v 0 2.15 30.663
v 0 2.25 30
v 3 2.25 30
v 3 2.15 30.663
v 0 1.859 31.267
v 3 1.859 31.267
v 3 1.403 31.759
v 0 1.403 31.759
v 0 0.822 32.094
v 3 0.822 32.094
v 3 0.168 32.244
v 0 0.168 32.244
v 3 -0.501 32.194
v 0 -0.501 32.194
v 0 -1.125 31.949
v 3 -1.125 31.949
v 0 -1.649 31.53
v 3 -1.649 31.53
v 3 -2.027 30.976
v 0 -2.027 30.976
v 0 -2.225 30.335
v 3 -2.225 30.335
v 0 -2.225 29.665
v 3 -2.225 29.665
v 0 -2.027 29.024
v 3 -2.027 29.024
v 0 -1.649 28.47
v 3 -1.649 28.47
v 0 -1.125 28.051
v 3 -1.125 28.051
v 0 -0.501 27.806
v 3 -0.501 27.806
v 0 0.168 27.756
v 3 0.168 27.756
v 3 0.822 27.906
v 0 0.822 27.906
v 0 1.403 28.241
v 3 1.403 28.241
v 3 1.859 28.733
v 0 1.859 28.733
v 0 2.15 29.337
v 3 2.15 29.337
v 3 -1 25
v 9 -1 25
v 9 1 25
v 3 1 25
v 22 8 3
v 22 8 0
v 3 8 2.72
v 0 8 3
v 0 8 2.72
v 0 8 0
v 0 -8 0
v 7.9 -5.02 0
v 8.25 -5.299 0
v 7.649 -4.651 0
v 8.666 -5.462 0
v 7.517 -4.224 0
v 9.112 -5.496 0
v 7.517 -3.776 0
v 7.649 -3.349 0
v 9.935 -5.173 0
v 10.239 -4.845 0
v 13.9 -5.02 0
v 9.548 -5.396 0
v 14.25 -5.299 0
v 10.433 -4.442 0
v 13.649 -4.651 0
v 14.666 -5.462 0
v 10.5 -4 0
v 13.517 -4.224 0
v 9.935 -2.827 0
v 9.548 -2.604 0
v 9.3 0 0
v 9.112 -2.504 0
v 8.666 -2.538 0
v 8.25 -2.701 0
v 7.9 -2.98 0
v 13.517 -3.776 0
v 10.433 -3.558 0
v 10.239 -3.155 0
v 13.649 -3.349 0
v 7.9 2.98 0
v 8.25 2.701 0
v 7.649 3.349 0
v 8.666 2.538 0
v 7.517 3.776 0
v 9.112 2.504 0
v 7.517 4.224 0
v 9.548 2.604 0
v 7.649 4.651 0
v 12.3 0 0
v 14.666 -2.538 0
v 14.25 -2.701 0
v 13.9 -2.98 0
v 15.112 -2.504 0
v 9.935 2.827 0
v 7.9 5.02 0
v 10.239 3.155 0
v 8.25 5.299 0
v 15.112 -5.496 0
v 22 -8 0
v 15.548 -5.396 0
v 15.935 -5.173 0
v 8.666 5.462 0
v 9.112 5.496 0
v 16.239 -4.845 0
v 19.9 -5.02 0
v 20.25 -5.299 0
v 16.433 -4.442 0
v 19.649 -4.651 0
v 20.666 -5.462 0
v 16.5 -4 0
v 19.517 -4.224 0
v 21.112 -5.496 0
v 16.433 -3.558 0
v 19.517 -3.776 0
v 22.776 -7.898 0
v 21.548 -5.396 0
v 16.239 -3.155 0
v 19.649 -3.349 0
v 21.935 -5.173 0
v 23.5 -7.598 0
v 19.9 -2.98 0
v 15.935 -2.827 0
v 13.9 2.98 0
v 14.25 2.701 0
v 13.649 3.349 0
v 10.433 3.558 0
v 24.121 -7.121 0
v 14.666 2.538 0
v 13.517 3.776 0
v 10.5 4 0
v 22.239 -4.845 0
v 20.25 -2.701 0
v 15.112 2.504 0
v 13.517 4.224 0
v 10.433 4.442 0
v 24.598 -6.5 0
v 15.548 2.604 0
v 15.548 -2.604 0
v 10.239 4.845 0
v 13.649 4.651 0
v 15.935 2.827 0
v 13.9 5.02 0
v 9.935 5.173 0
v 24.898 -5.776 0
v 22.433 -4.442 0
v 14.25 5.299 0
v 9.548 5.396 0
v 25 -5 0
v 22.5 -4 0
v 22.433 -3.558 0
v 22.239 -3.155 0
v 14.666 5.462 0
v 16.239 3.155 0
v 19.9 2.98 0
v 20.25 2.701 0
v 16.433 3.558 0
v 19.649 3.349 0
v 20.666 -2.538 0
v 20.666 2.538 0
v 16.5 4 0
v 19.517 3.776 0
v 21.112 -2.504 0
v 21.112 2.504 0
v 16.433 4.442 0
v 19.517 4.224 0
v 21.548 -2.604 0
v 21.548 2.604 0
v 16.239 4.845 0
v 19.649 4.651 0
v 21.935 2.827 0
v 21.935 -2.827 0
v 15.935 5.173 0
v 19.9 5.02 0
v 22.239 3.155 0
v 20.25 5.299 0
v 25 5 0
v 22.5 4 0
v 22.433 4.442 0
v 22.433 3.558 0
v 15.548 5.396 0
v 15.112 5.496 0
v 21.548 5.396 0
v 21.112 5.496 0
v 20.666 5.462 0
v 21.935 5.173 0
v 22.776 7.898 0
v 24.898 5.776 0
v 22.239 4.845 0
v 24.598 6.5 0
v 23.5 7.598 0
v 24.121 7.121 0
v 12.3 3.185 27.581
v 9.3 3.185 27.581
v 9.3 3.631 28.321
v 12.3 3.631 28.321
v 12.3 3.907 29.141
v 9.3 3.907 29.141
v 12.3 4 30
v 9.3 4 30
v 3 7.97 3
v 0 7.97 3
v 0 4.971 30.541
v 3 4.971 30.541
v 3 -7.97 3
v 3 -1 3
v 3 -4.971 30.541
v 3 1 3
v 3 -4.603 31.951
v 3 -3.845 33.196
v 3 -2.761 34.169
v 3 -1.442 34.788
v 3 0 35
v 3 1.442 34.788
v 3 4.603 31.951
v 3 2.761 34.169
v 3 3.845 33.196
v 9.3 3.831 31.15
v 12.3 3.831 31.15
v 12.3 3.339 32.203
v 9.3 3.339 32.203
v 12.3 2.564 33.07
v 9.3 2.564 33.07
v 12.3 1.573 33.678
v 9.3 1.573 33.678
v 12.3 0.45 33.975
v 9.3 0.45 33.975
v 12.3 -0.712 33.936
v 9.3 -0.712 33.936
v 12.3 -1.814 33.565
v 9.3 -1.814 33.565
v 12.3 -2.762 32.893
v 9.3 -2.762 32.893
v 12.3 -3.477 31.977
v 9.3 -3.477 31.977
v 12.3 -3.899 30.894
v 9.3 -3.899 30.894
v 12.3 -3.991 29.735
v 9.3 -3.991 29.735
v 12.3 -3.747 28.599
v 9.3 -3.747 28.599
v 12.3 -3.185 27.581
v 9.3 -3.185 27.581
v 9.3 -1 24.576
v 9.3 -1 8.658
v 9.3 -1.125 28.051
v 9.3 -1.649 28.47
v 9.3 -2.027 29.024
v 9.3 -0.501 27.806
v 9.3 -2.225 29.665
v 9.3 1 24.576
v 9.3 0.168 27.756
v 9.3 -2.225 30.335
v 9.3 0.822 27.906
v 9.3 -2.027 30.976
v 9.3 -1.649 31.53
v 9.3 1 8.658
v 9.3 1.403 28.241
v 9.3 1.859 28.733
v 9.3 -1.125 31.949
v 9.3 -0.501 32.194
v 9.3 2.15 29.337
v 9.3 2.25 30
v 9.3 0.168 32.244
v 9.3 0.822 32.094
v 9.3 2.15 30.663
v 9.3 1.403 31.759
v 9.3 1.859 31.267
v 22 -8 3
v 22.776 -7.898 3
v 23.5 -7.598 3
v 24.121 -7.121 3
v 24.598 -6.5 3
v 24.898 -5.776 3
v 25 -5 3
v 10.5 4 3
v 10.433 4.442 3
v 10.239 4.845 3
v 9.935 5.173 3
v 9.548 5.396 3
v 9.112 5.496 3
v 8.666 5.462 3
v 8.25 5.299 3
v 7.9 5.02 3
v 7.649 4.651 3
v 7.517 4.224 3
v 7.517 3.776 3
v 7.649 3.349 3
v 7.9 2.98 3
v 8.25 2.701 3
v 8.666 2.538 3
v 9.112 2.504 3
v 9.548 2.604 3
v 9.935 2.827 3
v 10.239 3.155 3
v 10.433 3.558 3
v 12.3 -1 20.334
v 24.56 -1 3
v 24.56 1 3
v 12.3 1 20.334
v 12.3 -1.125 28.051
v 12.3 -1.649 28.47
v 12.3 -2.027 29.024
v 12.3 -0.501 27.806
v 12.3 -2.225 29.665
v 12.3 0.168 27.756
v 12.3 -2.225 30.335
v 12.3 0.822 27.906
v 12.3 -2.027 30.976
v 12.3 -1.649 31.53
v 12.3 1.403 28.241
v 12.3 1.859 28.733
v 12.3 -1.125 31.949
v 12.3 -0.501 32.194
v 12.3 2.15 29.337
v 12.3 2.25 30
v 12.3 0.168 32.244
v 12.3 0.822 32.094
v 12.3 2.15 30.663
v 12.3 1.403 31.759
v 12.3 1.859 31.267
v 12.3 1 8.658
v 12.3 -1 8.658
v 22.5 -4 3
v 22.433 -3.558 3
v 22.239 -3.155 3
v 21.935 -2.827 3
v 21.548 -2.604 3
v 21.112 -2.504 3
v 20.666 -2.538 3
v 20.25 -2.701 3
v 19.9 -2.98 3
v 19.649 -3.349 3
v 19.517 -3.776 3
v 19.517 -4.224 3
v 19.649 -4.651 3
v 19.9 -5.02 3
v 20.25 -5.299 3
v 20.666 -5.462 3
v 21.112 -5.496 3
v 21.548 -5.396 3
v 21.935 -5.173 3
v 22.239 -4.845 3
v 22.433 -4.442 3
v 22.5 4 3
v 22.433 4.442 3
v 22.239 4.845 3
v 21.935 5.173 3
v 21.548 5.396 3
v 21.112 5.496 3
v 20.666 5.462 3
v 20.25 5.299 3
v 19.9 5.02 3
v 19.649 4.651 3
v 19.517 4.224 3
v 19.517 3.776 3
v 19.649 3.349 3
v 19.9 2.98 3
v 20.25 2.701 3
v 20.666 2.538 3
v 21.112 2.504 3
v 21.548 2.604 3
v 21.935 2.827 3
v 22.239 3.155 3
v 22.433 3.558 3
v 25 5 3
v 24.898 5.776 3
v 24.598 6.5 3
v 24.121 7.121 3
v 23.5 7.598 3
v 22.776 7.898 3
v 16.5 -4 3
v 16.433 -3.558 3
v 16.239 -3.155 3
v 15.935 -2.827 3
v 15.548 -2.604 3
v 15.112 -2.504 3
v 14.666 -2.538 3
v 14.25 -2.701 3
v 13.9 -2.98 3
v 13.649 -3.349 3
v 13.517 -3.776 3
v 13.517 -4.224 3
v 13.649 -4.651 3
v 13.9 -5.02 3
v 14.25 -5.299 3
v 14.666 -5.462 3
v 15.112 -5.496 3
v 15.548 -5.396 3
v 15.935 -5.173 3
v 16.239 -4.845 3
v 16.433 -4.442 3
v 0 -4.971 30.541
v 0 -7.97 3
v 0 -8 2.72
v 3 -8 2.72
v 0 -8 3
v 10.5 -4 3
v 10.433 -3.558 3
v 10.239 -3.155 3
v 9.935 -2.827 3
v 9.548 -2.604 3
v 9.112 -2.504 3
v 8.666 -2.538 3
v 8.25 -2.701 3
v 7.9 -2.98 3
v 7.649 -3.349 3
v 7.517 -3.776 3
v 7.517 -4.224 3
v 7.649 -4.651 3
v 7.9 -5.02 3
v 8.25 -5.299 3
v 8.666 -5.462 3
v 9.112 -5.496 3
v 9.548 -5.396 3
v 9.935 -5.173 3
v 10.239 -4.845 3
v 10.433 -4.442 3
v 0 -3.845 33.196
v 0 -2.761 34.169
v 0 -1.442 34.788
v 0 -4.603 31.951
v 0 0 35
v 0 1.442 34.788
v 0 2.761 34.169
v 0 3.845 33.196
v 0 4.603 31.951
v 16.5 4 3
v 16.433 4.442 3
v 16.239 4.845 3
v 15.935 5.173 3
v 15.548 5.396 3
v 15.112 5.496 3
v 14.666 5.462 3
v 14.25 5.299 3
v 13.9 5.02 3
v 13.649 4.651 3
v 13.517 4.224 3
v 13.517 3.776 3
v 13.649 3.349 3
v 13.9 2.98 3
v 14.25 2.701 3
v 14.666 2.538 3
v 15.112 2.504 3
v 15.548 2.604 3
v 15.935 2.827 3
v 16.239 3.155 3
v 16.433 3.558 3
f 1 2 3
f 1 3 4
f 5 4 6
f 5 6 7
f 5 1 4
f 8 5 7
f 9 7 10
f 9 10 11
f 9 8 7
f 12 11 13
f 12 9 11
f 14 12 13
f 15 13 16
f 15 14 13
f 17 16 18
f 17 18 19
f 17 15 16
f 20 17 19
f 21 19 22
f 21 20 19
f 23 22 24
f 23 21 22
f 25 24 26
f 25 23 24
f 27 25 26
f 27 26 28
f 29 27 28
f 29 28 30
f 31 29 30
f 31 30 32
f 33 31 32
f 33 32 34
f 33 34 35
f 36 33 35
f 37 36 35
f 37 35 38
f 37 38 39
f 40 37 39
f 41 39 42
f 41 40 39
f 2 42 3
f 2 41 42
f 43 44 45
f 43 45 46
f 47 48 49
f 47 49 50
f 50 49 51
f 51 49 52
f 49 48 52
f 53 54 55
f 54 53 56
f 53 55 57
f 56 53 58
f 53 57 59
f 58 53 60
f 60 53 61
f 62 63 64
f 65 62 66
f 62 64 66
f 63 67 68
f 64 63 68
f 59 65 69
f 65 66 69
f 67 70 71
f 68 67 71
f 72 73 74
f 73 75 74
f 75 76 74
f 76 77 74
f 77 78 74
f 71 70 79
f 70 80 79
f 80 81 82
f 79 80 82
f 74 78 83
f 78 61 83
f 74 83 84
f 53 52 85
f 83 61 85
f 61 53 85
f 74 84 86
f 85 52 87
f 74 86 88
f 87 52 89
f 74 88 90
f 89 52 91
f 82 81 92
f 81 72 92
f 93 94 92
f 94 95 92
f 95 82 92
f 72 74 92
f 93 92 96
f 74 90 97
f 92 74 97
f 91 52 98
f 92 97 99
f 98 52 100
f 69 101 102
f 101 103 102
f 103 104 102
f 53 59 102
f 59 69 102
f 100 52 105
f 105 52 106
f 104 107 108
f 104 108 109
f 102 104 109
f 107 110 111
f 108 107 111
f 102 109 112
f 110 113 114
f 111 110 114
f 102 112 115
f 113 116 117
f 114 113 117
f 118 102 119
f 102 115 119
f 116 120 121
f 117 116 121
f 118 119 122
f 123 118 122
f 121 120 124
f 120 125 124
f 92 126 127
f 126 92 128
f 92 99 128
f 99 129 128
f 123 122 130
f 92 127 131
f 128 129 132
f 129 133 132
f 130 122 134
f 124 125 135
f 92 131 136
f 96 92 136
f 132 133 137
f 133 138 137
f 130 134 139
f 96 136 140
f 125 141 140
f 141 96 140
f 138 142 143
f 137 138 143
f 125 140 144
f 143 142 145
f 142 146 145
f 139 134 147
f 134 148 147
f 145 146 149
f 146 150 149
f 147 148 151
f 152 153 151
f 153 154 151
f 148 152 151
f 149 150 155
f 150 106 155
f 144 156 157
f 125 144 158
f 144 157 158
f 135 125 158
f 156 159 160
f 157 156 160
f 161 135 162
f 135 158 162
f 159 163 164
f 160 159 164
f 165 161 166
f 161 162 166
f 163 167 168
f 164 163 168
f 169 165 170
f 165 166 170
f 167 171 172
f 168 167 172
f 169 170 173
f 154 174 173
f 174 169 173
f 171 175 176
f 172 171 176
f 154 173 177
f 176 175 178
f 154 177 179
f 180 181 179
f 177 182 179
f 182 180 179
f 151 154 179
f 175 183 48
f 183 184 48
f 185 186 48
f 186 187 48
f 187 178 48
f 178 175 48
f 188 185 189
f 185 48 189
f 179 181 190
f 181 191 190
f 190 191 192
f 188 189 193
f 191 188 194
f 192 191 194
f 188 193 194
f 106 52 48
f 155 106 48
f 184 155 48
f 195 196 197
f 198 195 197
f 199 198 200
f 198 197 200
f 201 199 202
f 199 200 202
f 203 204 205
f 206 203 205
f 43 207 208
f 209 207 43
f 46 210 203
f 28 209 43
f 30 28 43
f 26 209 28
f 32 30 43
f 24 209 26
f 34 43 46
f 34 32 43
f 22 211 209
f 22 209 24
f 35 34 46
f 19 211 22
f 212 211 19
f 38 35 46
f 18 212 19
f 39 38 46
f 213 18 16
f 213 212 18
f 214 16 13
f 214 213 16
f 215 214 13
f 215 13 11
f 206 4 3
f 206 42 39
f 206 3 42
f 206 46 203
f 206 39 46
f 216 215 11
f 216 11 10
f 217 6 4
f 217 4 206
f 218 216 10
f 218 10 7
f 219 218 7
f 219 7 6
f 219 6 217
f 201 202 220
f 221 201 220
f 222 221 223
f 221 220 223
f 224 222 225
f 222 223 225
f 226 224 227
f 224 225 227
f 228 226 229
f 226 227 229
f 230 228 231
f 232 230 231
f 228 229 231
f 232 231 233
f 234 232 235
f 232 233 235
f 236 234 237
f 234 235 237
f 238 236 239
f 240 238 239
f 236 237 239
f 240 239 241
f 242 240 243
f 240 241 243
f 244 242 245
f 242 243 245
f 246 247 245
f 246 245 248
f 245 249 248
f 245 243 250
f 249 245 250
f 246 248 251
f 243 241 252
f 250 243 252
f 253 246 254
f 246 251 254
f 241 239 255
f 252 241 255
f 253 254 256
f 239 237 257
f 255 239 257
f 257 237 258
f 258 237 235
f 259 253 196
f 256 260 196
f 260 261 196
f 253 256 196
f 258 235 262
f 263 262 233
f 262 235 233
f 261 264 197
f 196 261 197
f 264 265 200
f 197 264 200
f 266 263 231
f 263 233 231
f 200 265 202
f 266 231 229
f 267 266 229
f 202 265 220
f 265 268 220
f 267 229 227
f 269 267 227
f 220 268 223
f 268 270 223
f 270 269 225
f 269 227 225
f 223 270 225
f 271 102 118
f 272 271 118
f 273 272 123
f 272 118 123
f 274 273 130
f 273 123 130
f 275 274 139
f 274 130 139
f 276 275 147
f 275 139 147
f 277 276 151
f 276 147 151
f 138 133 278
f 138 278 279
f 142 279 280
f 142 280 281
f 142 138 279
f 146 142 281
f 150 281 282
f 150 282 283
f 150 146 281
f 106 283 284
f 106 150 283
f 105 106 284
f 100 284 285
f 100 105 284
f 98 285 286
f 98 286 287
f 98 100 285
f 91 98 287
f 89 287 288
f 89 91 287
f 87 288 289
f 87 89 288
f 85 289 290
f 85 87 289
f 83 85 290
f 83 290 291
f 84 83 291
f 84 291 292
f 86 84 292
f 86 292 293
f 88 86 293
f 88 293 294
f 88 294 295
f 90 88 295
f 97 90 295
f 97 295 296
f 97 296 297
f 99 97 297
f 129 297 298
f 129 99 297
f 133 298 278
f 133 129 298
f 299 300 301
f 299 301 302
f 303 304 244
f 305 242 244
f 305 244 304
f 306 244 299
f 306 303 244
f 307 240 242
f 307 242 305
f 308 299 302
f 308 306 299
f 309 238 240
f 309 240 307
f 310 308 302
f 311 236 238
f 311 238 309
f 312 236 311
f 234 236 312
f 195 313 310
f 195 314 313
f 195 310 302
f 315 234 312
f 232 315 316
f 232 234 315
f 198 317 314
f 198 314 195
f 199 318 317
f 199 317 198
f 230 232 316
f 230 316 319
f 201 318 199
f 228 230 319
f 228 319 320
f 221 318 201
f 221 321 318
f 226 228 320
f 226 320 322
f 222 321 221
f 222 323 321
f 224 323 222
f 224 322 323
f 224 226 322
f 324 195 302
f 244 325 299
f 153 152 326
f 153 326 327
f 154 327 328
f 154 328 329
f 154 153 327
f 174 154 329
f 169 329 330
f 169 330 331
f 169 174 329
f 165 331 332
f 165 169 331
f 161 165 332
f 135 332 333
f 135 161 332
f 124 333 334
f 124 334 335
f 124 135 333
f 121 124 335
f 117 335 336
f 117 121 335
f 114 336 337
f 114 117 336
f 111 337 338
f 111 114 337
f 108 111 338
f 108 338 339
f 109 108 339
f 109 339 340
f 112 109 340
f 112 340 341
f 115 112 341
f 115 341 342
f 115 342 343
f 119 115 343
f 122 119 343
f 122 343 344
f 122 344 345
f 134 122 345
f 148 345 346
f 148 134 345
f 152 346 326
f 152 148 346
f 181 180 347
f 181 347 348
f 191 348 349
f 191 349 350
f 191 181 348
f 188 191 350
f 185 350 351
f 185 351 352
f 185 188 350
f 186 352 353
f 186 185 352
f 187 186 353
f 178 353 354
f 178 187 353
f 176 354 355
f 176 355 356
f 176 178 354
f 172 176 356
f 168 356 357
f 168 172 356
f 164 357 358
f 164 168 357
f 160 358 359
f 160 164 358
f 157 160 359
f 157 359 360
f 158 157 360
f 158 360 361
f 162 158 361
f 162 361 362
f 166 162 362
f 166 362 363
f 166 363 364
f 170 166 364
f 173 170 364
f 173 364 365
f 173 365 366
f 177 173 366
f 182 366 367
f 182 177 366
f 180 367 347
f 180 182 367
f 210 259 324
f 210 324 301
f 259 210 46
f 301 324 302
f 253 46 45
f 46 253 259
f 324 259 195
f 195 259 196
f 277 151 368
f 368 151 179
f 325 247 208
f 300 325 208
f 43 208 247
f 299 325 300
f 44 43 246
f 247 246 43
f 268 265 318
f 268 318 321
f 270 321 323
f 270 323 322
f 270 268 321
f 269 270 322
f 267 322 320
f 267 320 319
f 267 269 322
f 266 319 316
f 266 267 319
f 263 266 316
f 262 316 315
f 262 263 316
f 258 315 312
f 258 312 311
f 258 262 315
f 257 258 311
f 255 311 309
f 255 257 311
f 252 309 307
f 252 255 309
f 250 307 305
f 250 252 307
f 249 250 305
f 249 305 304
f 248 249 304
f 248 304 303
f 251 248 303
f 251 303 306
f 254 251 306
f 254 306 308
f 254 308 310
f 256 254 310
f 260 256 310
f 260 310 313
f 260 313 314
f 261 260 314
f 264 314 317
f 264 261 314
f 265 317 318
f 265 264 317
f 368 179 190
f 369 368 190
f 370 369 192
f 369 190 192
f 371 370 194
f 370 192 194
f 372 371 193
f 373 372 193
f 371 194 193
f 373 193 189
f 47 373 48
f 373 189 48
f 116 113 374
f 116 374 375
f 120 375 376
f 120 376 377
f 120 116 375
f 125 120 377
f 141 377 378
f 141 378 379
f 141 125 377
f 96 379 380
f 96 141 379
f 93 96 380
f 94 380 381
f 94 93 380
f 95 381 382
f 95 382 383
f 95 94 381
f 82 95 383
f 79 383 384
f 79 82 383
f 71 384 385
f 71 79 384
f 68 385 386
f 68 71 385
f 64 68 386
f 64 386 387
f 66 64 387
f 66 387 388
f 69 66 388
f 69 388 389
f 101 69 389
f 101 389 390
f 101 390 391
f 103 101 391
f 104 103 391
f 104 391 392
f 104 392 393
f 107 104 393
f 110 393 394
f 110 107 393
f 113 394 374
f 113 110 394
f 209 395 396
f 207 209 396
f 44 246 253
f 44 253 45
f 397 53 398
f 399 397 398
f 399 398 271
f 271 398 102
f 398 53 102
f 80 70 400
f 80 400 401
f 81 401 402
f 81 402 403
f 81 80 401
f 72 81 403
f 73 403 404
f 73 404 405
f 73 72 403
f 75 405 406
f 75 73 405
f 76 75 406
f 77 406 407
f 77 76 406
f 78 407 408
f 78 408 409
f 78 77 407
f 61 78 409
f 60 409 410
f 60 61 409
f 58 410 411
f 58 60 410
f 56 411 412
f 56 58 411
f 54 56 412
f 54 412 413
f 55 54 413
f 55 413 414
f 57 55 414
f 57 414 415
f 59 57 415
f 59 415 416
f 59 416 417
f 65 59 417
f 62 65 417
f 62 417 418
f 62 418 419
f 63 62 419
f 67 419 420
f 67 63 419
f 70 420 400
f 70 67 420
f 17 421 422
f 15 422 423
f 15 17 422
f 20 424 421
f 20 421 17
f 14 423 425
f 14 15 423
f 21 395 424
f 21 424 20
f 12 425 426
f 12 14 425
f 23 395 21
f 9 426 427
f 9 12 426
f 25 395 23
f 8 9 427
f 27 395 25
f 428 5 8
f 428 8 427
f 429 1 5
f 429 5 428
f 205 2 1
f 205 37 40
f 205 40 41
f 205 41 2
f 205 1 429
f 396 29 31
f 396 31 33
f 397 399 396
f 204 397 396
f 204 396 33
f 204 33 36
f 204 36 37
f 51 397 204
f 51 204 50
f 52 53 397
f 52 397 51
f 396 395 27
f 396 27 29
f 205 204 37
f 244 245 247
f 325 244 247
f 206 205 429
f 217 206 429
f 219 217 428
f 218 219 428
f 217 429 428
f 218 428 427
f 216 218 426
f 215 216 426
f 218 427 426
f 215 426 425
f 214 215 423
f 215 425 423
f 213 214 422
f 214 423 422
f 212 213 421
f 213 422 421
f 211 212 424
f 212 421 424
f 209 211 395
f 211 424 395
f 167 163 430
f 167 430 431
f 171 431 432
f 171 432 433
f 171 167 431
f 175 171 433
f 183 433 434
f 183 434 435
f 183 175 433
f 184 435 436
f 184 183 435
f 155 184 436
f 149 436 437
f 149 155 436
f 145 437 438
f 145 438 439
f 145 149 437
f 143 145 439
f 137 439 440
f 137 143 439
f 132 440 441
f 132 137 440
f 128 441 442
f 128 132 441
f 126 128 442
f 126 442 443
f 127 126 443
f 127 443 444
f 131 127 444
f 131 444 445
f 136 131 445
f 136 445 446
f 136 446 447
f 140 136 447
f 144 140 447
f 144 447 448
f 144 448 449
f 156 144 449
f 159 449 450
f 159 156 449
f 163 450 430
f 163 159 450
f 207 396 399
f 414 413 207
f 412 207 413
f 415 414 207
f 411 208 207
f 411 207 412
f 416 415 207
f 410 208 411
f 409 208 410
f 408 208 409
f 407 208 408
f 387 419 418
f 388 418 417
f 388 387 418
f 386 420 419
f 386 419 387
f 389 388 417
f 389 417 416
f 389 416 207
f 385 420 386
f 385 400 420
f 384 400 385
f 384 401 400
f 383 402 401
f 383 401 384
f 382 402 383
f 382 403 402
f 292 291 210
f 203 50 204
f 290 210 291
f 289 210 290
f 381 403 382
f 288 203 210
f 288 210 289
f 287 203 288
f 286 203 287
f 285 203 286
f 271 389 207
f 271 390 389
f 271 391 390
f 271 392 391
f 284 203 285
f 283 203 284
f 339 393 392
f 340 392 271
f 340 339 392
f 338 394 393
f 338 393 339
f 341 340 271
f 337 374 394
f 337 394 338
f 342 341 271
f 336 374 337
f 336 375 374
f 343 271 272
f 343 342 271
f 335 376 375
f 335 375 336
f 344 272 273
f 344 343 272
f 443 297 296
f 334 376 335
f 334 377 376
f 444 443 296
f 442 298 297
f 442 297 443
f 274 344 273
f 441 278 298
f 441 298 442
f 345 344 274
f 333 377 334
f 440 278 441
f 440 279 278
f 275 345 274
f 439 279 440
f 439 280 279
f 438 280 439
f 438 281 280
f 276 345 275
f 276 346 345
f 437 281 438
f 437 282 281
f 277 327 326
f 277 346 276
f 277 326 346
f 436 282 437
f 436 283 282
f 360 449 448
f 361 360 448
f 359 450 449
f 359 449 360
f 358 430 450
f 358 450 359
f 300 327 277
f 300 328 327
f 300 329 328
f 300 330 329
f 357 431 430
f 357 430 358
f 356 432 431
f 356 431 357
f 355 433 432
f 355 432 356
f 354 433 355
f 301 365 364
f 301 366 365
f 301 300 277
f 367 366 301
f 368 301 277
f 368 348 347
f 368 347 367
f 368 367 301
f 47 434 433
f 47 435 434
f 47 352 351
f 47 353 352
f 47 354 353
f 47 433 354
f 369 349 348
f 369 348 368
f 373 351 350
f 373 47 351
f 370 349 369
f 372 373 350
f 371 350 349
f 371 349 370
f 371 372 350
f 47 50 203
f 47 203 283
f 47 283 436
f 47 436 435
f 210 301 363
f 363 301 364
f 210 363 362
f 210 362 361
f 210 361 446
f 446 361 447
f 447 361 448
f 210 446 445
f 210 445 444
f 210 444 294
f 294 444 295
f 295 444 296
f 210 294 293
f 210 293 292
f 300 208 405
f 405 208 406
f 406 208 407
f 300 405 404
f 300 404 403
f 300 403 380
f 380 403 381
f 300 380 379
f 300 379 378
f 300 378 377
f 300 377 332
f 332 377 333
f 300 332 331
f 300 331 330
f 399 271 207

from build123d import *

# Parameters (mm, degrees)
F0_R          = 1.5
F0_W          = 3.5
F0_H          = 16
F1_DEPTH      = 3
F2_R          = 2.25
F3_DEPTH      = 3
F5_DEPTH      = 1
F5_DEPTH_BACK = 1
F7_R          = 2.25
F8_DEPTH      = 3


with BuildPart() as f1:
    # F0 (on Top) → F1 (new body)
    with BuildSketch(Plane.XY):
        with BuildLine():
            Line((3.5, 8), (3.5, -8))
            Line((3.5, -8), (22, -8))
            ThreePointArc((22, -8), (24.12132, -7.12132), (25, -5))
            Line((25, -5), (25, 5))
            ThreePointArc((25, 5), (24.12132, 7.12132), (22, 8))
            Line((22, 8), (3.5, 8))
        make_face()
        with Locations((9, -4)):
            Circle(F0_R, mode=Mode.SUBTRACT)
        with Locations((15, -4)):
            Circle(F0_R, mode=Mode.SUBTRACT)
        with Locations((21, -4)):
            Circle(F0_R, mode=Mode.SUBTRACT)
        with Locations((9, 4)):
            Circle(F0_R, mode=Mode.SUBTRACT)
        with Locations((15, 4)):
            Circle(F0_R, mode=Mode.SUBTRACT)
        with Locations((21, 4)):
            Circle(F0_R, mode=Mode.SUBTRACT)
        with Locations((1.75, 0)):
            Rectangle(F0_W, F0_H)
    extrude(amount=F1_DEPTH)

    # F2 (on Right) → F3 (join)
    with BuildSketch(Plane.YZ):
        with BuildLine():
            Line((8, 2.719934), (4.97062, 30.541236))
            ThreePointArc((4.97062, 30.541236), (0, 35), (-4.97062, 30.541236))
            Line((-4.97062, 30.541236), (-8, 2.719934))
            Line((-8, 2.719934), (8, 2.719934))
        make_face()
        with Locations((0, 30)):
            Circle(F2_R, mode=Mode.SUBTRACT)
    extrude(amount=F3_DEPTH)

    # F4 (on Front) → F5 (join, two sides)
    with BuildSketch(Plane.XZ) as f5_sk:
        Polygon((9, 25), (0, 25), (0, 2.631591), (24.820279, 2.631591), align=None)
    extrude(amount=F5_DEPTH)
    extrude(f5_sk.sketch, amount=-F5_DEPTH_BACK)

    # F7 (on offset) → F8 (join)
    with BuildSketch(Plane.YZ.offset(9.3)):
        with BuildLine():
            ThreePointArc((3.185419, 27.58068), (3.790889, 28.723613), (4, 30))
            ThreePointArc((4, 30), (-1.276387, 33.790889), (-3.185419, 27.58068))
            ThreePointArc((-3.185419, 27.58068), (0, 26), (3.185419, 27.58068))
        make_face()
        with Locations((0, 30)):
            Circle(F7_R, mode=Mode.SUBTRACT)
        with BuildLine():
            ThreePointArc((3.185419, 27.58068), (0, 26), (-3.185419, 27.58068))
            Line((-3.185419, 27.58068), (0, 0))
            Line((0, 0), (3.185419, 27.58068))
        make_face()
    extrude(amount=F8_DEPTH)


solid = f1.part
